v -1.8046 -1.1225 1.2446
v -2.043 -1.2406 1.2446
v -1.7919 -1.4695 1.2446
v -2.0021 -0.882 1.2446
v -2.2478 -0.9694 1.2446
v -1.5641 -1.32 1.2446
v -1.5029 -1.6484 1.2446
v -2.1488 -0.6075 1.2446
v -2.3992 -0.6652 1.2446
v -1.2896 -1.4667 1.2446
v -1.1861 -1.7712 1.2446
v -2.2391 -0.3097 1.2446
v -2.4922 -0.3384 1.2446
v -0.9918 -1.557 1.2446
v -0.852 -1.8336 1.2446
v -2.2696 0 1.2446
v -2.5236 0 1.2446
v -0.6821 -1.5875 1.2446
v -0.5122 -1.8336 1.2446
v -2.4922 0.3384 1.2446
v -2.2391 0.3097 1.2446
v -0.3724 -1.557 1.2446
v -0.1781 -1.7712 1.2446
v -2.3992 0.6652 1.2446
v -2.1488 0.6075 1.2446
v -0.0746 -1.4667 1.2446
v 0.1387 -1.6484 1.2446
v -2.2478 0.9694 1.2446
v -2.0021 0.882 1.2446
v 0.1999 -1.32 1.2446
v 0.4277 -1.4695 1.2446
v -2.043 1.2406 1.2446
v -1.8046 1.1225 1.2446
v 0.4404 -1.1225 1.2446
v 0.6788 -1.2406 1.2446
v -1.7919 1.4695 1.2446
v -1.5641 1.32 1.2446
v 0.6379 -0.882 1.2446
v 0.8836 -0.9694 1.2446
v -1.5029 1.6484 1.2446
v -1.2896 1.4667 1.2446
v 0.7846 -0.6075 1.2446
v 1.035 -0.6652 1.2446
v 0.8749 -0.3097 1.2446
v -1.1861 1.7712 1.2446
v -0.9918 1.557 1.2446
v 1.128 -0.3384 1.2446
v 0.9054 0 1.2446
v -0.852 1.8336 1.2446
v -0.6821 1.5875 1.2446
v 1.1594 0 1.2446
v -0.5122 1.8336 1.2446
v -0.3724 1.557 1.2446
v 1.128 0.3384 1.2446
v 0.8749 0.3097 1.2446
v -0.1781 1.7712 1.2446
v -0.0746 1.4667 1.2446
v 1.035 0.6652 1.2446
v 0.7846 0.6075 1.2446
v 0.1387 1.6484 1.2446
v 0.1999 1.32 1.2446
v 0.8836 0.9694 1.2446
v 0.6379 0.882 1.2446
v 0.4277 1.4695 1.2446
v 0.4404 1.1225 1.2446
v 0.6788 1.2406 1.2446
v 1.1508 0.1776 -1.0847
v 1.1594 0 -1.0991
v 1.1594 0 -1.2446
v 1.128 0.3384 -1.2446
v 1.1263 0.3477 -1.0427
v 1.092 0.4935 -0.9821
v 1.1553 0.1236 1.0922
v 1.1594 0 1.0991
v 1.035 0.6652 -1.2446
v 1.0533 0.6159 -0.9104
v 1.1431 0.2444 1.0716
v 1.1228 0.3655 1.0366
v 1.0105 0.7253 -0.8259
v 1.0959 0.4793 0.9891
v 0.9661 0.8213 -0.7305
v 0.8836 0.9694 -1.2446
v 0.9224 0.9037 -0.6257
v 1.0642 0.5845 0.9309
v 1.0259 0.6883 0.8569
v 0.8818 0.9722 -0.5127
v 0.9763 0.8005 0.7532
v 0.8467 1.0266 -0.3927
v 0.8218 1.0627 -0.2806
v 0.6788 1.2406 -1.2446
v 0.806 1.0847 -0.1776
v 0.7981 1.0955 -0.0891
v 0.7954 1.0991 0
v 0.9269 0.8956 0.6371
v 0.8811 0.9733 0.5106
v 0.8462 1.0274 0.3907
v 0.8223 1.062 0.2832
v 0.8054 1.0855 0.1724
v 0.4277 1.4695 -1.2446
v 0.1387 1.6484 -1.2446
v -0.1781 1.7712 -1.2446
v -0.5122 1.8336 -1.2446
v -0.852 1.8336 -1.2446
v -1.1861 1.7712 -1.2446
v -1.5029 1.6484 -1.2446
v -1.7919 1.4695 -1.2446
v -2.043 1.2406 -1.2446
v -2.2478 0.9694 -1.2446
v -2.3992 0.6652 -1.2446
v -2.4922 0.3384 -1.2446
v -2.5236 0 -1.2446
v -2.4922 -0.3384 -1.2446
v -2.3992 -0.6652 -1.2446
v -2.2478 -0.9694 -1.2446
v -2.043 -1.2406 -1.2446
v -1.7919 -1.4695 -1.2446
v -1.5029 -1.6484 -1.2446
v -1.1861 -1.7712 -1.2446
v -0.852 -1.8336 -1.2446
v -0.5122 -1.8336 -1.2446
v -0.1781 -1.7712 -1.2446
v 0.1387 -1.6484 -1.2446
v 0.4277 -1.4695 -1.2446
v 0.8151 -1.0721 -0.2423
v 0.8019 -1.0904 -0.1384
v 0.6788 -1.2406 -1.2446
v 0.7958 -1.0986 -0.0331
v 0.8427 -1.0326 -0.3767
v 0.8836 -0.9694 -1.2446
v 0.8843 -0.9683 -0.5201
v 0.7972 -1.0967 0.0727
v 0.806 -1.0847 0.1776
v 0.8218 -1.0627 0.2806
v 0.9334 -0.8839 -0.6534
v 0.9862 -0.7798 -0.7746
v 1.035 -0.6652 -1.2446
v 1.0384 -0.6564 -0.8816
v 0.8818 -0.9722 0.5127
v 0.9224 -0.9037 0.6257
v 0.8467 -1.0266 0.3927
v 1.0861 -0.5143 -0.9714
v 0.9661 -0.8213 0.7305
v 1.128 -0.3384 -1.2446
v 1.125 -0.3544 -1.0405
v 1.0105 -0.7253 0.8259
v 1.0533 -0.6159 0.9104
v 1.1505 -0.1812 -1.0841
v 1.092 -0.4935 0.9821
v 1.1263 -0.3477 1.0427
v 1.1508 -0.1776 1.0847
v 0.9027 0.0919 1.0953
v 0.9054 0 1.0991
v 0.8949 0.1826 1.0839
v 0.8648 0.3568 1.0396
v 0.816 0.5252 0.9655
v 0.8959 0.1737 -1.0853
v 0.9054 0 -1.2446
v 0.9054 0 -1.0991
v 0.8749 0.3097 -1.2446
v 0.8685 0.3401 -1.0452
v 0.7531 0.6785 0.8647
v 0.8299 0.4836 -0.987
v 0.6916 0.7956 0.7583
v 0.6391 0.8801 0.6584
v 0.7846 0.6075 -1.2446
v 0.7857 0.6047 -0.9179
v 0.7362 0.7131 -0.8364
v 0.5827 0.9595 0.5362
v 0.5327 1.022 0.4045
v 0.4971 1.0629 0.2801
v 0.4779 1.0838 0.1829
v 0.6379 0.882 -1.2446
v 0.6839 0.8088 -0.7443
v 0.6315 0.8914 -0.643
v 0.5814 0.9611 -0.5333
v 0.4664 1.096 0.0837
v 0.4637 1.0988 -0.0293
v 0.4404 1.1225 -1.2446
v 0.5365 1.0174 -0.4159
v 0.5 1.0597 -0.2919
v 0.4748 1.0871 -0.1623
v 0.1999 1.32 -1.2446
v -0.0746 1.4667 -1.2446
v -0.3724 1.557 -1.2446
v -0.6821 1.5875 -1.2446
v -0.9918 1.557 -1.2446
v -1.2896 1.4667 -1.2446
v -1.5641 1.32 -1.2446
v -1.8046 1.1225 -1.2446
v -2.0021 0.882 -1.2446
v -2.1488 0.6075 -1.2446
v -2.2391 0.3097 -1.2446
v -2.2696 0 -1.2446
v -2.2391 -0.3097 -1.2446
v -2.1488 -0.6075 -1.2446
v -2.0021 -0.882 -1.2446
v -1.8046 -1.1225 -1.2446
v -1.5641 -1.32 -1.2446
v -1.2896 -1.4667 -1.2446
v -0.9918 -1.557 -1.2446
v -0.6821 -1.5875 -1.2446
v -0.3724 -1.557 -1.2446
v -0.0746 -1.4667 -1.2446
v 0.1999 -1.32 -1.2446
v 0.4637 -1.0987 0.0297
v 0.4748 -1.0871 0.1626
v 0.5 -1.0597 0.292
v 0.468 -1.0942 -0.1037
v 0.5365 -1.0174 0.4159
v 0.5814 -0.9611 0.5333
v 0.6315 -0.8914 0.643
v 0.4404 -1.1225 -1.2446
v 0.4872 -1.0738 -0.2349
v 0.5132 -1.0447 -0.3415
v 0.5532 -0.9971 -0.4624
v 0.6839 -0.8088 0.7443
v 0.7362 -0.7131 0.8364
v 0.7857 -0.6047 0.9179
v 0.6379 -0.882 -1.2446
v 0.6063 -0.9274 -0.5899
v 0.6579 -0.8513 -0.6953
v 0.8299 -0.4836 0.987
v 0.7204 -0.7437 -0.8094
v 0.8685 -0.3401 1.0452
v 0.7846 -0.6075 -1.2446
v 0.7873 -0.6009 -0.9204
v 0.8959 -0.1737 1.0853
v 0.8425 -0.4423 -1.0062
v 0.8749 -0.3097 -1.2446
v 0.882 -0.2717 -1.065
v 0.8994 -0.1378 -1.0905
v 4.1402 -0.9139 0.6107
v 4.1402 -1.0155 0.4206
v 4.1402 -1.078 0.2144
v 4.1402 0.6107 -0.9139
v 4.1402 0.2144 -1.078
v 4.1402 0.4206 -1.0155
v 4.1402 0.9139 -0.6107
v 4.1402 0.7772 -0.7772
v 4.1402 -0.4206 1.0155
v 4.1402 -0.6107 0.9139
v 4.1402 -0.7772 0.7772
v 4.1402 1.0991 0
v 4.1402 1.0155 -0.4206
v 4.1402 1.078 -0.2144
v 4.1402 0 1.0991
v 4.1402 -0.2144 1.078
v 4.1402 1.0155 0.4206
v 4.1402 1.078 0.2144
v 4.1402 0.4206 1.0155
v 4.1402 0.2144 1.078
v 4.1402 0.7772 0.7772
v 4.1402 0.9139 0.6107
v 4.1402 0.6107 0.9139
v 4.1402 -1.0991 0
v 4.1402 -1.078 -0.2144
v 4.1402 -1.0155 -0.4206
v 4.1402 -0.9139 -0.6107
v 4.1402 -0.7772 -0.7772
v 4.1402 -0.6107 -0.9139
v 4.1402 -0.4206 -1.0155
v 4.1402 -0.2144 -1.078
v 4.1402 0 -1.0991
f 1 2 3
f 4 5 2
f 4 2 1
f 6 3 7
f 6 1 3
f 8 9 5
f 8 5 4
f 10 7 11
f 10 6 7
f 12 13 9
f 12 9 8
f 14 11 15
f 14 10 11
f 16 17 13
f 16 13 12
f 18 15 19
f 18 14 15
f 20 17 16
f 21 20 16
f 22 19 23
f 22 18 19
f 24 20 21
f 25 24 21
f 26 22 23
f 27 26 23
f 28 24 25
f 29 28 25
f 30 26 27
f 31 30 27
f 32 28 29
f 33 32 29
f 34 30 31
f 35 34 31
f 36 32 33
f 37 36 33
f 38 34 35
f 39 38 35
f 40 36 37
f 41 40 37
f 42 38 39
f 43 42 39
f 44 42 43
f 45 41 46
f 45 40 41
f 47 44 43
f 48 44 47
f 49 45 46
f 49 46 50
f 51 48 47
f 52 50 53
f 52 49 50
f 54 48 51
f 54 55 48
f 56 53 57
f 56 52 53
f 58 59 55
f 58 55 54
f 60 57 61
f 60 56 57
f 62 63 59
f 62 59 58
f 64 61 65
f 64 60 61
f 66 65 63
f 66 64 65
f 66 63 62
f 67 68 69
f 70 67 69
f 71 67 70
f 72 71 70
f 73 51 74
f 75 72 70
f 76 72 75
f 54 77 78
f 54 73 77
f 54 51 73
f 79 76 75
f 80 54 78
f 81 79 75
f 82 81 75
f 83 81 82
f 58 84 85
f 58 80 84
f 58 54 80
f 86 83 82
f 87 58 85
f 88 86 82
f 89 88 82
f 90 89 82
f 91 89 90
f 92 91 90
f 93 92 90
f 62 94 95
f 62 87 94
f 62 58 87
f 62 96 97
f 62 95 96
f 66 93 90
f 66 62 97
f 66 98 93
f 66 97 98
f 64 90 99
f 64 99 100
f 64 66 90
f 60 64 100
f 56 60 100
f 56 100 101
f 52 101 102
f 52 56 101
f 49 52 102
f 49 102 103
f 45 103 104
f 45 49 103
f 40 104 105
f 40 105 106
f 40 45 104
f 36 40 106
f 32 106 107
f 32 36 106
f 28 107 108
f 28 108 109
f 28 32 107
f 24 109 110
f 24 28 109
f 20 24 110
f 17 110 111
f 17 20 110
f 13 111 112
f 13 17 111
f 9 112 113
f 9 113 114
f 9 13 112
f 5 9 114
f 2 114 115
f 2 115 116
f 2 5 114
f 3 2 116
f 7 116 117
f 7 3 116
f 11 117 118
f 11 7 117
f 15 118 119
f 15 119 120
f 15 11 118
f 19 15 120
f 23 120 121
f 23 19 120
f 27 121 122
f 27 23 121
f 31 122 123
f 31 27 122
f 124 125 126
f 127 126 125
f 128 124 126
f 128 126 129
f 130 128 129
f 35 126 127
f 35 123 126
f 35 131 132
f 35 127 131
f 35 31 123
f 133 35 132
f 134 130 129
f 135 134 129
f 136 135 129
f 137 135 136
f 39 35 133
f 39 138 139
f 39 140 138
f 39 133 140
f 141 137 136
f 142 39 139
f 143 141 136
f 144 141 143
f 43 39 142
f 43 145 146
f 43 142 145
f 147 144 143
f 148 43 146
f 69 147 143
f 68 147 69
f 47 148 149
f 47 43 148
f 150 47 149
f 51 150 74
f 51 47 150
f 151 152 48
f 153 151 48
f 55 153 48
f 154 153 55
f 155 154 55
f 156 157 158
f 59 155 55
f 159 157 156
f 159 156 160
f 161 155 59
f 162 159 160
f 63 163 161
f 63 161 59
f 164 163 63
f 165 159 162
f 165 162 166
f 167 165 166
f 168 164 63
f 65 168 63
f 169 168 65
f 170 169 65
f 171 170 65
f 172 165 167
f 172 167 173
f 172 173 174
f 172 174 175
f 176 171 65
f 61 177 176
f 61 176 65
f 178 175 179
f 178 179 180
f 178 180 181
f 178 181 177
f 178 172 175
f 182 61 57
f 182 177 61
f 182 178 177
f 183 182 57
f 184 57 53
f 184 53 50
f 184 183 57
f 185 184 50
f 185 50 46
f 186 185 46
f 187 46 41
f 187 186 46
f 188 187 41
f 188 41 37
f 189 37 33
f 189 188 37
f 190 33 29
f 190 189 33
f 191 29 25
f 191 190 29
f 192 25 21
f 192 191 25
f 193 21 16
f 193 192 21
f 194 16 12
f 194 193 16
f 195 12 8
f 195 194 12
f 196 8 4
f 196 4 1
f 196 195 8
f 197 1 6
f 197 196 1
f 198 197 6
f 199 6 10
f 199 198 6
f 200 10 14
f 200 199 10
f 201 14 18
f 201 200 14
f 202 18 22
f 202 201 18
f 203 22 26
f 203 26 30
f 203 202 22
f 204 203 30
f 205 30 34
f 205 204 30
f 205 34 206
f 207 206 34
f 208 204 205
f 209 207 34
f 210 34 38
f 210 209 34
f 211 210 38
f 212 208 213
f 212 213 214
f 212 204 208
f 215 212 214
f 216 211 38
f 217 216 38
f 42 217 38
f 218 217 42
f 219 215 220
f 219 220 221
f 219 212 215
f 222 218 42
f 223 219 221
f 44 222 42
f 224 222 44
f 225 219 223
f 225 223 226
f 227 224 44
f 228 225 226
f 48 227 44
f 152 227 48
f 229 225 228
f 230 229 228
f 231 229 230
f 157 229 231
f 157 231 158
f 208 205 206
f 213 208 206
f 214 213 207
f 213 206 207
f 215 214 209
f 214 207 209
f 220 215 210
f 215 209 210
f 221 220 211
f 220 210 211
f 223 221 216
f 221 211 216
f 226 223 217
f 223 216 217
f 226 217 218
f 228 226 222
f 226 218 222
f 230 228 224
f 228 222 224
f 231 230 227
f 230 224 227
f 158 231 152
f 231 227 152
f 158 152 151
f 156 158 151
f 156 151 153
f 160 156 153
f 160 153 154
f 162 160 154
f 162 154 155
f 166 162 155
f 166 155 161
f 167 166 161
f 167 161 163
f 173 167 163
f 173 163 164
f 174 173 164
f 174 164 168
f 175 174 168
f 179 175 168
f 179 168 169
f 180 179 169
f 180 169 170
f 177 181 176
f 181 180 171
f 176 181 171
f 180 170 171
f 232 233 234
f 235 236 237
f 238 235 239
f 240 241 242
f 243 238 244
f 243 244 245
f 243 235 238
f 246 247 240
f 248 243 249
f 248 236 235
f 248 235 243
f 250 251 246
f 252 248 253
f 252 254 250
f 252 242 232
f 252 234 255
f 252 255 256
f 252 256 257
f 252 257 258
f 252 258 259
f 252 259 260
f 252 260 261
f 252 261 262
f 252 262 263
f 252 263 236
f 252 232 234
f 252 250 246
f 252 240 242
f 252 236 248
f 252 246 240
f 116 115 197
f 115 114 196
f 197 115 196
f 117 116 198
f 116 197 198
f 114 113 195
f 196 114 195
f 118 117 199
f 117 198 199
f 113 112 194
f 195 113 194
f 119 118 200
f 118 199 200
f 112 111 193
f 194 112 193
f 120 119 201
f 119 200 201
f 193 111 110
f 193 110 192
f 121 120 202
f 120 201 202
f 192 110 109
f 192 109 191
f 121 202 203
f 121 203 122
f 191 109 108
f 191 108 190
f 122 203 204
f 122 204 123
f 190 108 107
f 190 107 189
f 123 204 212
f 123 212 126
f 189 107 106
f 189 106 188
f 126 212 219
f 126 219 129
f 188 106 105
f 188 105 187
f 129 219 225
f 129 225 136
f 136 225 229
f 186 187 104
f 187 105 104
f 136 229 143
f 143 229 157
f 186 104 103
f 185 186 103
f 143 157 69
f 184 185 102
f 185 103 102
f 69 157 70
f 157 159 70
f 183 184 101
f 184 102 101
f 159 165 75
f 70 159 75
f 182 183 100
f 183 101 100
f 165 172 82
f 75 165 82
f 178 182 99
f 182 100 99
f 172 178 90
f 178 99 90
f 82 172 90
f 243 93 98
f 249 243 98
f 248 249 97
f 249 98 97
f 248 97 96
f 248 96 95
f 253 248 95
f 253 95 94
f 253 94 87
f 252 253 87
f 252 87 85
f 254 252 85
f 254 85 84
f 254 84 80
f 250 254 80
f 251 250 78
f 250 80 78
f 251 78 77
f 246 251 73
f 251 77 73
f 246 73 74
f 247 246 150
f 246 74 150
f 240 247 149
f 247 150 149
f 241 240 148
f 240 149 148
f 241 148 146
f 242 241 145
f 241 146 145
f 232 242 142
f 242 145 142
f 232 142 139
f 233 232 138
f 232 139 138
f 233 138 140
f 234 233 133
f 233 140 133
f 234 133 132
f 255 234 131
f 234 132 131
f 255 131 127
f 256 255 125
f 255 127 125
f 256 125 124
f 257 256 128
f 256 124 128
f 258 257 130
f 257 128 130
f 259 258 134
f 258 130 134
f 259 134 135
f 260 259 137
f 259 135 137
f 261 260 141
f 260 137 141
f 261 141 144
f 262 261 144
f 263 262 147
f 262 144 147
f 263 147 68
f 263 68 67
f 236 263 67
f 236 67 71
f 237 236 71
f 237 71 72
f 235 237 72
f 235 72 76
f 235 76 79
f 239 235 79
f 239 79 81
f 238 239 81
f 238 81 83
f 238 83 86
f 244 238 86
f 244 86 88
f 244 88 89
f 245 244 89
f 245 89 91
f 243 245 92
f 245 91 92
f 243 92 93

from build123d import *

# Parameters (mm, degrees)
F0_R     = 1.8415
F0_R_2   = 1.5875
F1_DEPTH = 1.2446
F2_R     = 1.099143
F3_DEPTH = 4.1402
F4_DEPTH = 12.7


with BuildPart() as f1:
    # F0 (on Top) → F1 (new body, symmetric)
    with BuildSketch(Plane.XY):
        with Locations((-0.6821, 0)):
            Circle(F0_R)
        with Locations((-0.6821, 0)):
            Circle(F0_R_2, mode=Mode.SUBTRACT)
    extrude(amount=F1_DEPTH, both=True)

    # F2 (on Right) → F3 (join)
    with BuildSketch(Plane.YZ):
        Circle(F2_R)
    extrude(amount=F3_DEPTH)

    # F0 (on Top) → F4 (cut, symmetric)
    with BuildSketch(Plane.XY):
        with Locations((-0.6821, 0)):
            Circle(F0_R_2)
    extrude(amount=F4_DEPTH, both=True, mode=Mode.SUBTRACT)


solid = f1.part
